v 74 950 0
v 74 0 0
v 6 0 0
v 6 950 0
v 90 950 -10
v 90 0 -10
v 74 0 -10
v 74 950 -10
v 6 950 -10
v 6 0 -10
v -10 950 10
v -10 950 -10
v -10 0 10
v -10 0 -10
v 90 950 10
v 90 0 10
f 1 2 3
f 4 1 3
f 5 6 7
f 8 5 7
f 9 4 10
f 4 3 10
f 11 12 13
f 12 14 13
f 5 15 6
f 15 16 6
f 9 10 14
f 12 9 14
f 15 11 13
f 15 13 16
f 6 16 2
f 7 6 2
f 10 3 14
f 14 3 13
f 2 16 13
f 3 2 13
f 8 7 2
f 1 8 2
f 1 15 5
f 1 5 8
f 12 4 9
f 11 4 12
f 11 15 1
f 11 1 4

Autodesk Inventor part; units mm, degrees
ref_plane "YZ Plane" through (0, 0, 0) normal (1, 0, 0) x (0, 1, 0)
ref_plane "XZ Plane" through (0, 0, 0) normal (0, 1, 0) x (-1, 0, 0)
ref_plane "XY Plane" through (0, 0, 0) normal (0, 0, 1) x (1, 0, 0)
sketch "Sketch1" plane through (0, 0, 0) normal (0, 1, 0) x (-1, 0, 0)
  line L0 (10, 10) -> (-90, 10)
  line L1 (-90, 10) -> (-90, -10)
  line L2 (-90, -10) -> (10, -10)
  line L3 (10, -10) -> (10, 10)
  line L4 (-6, -15) -> (-74, -15)
  line L5 (-74, -15) -> (-74, 0)
  line L6 (-74, 0) -> (-6, 0)
  line L7 (-6, 0) -> (-6, -15)
  point P0 (0, 0)
  point P1 (-74, -10)
  point P2 (-6, -10)
  dimension "d0" = 20
  dimension "d1" = 100
  dimension "d4" = 10
  dimension "d5" = 16
  dimension "d6" = 16
extrude "Extrusion1" add sketch "Sketch1" along normal blind 950 contours L3 L2 L7 L6 L5 L1 L0
properties part number "L_PlNKA800" material "Aluminum 6061"
